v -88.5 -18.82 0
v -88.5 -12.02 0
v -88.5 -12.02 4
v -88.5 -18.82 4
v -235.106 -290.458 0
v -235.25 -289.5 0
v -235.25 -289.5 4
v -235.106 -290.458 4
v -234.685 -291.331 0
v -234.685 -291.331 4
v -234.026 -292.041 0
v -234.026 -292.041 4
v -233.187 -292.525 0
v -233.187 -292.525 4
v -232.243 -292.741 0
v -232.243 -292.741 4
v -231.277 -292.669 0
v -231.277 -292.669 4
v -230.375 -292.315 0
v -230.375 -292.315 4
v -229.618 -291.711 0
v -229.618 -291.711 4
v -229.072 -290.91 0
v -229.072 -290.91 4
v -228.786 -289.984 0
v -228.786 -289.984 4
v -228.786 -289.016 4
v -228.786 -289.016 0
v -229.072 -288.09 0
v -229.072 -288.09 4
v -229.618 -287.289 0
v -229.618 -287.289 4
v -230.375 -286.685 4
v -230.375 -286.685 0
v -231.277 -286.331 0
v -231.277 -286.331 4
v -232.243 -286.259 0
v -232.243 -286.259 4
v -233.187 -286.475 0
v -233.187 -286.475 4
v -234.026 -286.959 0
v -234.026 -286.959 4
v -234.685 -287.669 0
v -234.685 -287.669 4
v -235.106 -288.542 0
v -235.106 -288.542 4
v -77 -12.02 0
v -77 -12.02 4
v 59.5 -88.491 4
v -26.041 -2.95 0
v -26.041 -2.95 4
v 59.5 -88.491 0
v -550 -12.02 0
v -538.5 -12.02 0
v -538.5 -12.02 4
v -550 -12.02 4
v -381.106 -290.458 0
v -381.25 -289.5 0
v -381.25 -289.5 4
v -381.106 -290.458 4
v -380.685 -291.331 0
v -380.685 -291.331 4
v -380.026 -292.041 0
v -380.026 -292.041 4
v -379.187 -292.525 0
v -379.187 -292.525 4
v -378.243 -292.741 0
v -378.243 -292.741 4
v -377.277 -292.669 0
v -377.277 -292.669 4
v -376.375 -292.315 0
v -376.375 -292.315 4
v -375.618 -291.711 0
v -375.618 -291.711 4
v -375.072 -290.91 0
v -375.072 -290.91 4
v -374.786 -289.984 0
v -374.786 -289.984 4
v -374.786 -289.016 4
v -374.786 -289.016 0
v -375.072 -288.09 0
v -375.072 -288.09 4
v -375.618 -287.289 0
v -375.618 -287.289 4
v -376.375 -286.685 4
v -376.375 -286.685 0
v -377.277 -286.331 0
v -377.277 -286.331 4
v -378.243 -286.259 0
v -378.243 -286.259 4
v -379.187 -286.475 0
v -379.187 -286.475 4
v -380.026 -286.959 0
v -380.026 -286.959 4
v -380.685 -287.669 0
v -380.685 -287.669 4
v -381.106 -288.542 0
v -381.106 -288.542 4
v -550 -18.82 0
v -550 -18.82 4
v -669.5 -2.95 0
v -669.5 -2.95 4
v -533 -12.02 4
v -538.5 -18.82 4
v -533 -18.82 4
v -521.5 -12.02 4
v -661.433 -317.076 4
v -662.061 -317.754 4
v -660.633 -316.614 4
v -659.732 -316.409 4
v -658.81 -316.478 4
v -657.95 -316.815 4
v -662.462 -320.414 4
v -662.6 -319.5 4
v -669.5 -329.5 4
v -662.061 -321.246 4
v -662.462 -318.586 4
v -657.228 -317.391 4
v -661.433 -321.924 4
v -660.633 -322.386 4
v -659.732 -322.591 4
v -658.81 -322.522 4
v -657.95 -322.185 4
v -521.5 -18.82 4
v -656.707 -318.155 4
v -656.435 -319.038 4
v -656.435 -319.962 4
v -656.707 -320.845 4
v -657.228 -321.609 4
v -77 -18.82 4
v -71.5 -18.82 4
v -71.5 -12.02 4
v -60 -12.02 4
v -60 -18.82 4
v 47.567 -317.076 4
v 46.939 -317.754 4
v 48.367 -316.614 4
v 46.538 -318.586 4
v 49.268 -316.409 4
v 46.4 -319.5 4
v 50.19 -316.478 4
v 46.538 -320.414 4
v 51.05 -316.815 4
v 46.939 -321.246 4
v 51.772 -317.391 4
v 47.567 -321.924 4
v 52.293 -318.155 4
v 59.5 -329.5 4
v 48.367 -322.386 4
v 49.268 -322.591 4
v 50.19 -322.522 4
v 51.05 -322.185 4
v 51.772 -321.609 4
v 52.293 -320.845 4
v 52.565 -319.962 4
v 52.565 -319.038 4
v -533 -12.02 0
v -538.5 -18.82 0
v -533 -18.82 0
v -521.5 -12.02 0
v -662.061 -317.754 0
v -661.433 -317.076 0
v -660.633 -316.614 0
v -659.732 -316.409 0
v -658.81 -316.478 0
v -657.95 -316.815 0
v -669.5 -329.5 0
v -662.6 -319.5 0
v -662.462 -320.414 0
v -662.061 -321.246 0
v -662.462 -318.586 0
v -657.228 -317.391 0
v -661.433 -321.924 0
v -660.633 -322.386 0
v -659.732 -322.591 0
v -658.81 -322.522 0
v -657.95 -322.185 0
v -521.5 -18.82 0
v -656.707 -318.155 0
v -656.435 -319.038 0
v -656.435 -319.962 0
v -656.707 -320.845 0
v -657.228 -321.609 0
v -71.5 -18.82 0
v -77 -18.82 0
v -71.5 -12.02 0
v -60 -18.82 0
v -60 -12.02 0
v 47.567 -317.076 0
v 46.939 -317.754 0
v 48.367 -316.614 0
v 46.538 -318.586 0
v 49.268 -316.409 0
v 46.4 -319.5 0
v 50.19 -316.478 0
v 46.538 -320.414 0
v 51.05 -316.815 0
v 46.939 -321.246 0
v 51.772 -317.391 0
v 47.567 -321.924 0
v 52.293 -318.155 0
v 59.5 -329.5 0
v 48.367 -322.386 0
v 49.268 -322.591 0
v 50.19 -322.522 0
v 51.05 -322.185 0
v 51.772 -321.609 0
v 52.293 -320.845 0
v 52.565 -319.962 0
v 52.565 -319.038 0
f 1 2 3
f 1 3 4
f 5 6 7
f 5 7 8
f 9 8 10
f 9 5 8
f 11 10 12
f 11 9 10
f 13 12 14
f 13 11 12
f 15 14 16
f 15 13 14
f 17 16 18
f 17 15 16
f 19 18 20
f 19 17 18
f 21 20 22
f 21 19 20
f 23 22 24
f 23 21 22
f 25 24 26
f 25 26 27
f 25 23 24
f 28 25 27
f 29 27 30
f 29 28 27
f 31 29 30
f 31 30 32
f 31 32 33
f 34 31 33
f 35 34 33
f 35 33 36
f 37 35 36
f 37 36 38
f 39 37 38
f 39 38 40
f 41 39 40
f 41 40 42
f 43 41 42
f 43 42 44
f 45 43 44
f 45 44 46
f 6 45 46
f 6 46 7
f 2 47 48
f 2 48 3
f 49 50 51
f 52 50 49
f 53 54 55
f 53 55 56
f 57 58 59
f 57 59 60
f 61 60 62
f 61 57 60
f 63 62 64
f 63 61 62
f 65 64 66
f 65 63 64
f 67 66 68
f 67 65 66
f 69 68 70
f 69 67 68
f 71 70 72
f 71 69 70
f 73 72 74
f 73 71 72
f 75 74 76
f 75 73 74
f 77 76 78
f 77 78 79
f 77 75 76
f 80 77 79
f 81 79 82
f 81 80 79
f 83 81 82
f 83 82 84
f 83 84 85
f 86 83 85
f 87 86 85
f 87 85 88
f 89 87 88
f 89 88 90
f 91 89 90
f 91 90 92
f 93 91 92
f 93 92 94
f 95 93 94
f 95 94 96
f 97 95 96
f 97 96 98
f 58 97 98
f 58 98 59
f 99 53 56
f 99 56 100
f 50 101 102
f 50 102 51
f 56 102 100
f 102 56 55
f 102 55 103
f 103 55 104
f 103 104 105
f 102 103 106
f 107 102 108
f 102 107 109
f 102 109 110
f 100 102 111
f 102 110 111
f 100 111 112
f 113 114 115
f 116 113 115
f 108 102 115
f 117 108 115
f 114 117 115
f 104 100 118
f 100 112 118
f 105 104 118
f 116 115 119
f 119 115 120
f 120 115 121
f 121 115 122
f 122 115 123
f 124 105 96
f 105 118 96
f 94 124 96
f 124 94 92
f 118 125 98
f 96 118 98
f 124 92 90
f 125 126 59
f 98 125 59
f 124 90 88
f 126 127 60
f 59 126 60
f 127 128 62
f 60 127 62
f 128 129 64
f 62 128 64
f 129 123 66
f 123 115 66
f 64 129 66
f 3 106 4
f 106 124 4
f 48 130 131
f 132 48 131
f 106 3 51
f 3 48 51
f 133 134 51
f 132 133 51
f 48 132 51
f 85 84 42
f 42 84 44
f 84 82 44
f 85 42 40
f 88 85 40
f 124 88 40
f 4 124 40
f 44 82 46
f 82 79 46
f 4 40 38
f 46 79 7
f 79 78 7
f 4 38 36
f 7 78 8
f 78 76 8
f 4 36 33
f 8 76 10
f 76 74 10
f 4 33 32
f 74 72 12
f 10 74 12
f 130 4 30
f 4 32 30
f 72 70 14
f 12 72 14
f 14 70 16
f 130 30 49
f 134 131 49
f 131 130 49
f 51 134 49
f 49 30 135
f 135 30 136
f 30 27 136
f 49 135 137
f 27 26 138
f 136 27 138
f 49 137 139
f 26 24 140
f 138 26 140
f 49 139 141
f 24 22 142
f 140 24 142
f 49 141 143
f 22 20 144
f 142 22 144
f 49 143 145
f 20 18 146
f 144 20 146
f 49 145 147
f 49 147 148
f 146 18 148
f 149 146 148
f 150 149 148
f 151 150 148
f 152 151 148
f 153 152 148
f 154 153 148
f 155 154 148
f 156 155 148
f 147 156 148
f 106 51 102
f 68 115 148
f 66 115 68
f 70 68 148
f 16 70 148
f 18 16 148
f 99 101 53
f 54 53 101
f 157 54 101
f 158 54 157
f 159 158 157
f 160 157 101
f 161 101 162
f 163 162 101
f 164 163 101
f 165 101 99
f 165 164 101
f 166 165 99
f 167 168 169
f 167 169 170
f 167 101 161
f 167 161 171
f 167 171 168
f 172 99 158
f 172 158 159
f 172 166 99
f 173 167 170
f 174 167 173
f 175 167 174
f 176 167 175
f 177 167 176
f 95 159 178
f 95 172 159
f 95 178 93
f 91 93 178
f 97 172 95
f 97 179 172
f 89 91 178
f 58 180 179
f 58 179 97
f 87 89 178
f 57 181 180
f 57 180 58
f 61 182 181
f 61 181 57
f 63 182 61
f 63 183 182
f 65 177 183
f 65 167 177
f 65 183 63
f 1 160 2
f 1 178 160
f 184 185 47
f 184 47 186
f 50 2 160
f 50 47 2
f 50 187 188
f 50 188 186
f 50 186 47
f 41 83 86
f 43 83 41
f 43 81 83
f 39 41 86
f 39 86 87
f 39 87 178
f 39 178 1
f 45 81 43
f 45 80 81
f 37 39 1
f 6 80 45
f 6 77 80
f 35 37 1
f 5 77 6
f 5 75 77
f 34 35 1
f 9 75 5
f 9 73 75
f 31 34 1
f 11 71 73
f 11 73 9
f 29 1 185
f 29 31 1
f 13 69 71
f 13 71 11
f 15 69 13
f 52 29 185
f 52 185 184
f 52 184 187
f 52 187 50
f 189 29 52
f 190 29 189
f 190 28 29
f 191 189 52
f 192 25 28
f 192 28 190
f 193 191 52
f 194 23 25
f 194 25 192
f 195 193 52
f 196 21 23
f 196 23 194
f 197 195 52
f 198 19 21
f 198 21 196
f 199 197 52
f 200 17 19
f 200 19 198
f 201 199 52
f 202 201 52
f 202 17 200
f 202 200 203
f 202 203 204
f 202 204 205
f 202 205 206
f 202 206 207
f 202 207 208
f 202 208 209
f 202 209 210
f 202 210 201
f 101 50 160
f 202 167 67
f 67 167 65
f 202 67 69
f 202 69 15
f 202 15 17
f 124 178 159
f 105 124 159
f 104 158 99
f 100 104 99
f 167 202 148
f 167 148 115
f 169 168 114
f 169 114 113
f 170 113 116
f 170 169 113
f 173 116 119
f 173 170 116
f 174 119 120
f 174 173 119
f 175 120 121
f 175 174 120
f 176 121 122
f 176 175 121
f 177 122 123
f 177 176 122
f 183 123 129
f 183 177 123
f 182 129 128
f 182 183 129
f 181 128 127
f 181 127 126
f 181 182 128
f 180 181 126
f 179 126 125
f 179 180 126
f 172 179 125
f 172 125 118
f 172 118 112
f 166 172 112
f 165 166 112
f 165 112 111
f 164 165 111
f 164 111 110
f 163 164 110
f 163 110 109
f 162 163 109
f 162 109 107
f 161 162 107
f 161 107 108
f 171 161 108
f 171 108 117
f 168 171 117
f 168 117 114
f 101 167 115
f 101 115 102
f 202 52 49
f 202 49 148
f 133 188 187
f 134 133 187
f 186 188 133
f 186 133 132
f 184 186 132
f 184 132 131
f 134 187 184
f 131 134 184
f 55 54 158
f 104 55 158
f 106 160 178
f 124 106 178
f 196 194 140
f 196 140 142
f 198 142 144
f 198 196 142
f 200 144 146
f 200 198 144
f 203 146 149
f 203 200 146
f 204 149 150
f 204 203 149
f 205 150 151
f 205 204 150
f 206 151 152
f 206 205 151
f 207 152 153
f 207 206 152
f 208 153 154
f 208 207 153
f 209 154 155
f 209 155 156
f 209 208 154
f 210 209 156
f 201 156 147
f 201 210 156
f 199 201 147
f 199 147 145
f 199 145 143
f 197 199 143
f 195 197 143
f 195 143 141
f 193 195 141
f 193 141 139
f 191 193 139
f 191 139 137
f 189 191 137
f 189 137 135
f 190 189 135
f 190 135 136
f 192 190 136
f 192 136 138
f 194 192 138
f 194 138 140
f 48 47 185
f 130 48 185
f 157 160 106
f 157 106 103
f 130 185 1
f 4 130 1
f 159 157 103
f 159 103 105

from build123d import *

# Parameters (mm, degrees)
EXTRUDE_1_DEPTH     = 4
SKETCH_2_W          = 11.5
SKETCH_2_H          = 6.8
CUT_EXTRUDE_1_DEPTH = 747.201380326
SKETCH_3_R          = 3.25
CUT_EXTRUDE_2_DEPTH = 747.201380326
SKETCH_4_R          = 3.1
CUT_EXTRUDE_3_DEPTH = 747.201380326


with BuildPart() as part:
    # Эскиз1 → Бобышка-Вытянуть1 (new body)
    with BuildSketch(Plane.XY):
        Polygon((-669.5, 2.95), (-26.041378029, 2.95), (59.5, 88.491378029), (59.5, 329.5), (-669.5, 329.5), align=None)
    extrude(amount=EXTRUDE_1_DEPTH)

    # Эскиз2 → Вырез-Вытянуть1 (cut, through all)
    with BuildSketch(Plane(origin=(0, 0, 0), x_dir=(-1, 0, 0), z_dir=(0, 0, -1))):
        with Locations((65.75, 15.42)):
            Rectangle(SKETCH_2_W, SKETCH_2_H)
        with Locations((82.75, 15.42)):
            Rectangle(SKETCH_2_W, SKETCH_2_H)
        with Locations((527.25, 15.42)):
            Rectangle(SKETCH_2_W, SKETCH_2_H)
        with Locations((544.25, 15.42)):
            Rectangle(SKETCH_2_W, SKETCH_2_H)
    extrude(amount=-CUT_EXTRUDE_1_DEPTH, mode=Mode.SUBTRACT)

    # Эскиз3 → Вырез-Вытянуть2 (cut, through all)
    with BuildSketch(Plane(origin=(0, 0, 0), x_dir=(-1, 0, 0), z_dir=(0, 0, -1))):
        with Locations((232, 289.5)):
            Circle(SKETCH_3_R)
        with Locations((378, 289.5)):
            Circle(SKETCH_3_R)
    extrude(amount=-CUT_EXTRUDE_2_DEPTH, mode=Mode.SUBTRACT)

    # Эскиз4 → Вырез-Вытянуть3 (cut, through all)
    with BuildSketch(Plane(origin=(0, 0, 0), x_dir=(-1, 0, 0), z_dir=(0, 0, -1))):
        with Locations((-49.5, 319.5)):
            Circle(SKETCH_4_R)
        with Locations((659.5, 319.5)):
            Circle(SKETCH_4_R)
    extrude(amount=-CUT_EXTRUDE_3_DEPTH, mode=Mode.SUBTRACT)


with BuildPart() as body_2:
    # Зеркальное отражение1: mirrored copy
    add(part.part.mirror(Plane.ZX))


solid = body_2.part
